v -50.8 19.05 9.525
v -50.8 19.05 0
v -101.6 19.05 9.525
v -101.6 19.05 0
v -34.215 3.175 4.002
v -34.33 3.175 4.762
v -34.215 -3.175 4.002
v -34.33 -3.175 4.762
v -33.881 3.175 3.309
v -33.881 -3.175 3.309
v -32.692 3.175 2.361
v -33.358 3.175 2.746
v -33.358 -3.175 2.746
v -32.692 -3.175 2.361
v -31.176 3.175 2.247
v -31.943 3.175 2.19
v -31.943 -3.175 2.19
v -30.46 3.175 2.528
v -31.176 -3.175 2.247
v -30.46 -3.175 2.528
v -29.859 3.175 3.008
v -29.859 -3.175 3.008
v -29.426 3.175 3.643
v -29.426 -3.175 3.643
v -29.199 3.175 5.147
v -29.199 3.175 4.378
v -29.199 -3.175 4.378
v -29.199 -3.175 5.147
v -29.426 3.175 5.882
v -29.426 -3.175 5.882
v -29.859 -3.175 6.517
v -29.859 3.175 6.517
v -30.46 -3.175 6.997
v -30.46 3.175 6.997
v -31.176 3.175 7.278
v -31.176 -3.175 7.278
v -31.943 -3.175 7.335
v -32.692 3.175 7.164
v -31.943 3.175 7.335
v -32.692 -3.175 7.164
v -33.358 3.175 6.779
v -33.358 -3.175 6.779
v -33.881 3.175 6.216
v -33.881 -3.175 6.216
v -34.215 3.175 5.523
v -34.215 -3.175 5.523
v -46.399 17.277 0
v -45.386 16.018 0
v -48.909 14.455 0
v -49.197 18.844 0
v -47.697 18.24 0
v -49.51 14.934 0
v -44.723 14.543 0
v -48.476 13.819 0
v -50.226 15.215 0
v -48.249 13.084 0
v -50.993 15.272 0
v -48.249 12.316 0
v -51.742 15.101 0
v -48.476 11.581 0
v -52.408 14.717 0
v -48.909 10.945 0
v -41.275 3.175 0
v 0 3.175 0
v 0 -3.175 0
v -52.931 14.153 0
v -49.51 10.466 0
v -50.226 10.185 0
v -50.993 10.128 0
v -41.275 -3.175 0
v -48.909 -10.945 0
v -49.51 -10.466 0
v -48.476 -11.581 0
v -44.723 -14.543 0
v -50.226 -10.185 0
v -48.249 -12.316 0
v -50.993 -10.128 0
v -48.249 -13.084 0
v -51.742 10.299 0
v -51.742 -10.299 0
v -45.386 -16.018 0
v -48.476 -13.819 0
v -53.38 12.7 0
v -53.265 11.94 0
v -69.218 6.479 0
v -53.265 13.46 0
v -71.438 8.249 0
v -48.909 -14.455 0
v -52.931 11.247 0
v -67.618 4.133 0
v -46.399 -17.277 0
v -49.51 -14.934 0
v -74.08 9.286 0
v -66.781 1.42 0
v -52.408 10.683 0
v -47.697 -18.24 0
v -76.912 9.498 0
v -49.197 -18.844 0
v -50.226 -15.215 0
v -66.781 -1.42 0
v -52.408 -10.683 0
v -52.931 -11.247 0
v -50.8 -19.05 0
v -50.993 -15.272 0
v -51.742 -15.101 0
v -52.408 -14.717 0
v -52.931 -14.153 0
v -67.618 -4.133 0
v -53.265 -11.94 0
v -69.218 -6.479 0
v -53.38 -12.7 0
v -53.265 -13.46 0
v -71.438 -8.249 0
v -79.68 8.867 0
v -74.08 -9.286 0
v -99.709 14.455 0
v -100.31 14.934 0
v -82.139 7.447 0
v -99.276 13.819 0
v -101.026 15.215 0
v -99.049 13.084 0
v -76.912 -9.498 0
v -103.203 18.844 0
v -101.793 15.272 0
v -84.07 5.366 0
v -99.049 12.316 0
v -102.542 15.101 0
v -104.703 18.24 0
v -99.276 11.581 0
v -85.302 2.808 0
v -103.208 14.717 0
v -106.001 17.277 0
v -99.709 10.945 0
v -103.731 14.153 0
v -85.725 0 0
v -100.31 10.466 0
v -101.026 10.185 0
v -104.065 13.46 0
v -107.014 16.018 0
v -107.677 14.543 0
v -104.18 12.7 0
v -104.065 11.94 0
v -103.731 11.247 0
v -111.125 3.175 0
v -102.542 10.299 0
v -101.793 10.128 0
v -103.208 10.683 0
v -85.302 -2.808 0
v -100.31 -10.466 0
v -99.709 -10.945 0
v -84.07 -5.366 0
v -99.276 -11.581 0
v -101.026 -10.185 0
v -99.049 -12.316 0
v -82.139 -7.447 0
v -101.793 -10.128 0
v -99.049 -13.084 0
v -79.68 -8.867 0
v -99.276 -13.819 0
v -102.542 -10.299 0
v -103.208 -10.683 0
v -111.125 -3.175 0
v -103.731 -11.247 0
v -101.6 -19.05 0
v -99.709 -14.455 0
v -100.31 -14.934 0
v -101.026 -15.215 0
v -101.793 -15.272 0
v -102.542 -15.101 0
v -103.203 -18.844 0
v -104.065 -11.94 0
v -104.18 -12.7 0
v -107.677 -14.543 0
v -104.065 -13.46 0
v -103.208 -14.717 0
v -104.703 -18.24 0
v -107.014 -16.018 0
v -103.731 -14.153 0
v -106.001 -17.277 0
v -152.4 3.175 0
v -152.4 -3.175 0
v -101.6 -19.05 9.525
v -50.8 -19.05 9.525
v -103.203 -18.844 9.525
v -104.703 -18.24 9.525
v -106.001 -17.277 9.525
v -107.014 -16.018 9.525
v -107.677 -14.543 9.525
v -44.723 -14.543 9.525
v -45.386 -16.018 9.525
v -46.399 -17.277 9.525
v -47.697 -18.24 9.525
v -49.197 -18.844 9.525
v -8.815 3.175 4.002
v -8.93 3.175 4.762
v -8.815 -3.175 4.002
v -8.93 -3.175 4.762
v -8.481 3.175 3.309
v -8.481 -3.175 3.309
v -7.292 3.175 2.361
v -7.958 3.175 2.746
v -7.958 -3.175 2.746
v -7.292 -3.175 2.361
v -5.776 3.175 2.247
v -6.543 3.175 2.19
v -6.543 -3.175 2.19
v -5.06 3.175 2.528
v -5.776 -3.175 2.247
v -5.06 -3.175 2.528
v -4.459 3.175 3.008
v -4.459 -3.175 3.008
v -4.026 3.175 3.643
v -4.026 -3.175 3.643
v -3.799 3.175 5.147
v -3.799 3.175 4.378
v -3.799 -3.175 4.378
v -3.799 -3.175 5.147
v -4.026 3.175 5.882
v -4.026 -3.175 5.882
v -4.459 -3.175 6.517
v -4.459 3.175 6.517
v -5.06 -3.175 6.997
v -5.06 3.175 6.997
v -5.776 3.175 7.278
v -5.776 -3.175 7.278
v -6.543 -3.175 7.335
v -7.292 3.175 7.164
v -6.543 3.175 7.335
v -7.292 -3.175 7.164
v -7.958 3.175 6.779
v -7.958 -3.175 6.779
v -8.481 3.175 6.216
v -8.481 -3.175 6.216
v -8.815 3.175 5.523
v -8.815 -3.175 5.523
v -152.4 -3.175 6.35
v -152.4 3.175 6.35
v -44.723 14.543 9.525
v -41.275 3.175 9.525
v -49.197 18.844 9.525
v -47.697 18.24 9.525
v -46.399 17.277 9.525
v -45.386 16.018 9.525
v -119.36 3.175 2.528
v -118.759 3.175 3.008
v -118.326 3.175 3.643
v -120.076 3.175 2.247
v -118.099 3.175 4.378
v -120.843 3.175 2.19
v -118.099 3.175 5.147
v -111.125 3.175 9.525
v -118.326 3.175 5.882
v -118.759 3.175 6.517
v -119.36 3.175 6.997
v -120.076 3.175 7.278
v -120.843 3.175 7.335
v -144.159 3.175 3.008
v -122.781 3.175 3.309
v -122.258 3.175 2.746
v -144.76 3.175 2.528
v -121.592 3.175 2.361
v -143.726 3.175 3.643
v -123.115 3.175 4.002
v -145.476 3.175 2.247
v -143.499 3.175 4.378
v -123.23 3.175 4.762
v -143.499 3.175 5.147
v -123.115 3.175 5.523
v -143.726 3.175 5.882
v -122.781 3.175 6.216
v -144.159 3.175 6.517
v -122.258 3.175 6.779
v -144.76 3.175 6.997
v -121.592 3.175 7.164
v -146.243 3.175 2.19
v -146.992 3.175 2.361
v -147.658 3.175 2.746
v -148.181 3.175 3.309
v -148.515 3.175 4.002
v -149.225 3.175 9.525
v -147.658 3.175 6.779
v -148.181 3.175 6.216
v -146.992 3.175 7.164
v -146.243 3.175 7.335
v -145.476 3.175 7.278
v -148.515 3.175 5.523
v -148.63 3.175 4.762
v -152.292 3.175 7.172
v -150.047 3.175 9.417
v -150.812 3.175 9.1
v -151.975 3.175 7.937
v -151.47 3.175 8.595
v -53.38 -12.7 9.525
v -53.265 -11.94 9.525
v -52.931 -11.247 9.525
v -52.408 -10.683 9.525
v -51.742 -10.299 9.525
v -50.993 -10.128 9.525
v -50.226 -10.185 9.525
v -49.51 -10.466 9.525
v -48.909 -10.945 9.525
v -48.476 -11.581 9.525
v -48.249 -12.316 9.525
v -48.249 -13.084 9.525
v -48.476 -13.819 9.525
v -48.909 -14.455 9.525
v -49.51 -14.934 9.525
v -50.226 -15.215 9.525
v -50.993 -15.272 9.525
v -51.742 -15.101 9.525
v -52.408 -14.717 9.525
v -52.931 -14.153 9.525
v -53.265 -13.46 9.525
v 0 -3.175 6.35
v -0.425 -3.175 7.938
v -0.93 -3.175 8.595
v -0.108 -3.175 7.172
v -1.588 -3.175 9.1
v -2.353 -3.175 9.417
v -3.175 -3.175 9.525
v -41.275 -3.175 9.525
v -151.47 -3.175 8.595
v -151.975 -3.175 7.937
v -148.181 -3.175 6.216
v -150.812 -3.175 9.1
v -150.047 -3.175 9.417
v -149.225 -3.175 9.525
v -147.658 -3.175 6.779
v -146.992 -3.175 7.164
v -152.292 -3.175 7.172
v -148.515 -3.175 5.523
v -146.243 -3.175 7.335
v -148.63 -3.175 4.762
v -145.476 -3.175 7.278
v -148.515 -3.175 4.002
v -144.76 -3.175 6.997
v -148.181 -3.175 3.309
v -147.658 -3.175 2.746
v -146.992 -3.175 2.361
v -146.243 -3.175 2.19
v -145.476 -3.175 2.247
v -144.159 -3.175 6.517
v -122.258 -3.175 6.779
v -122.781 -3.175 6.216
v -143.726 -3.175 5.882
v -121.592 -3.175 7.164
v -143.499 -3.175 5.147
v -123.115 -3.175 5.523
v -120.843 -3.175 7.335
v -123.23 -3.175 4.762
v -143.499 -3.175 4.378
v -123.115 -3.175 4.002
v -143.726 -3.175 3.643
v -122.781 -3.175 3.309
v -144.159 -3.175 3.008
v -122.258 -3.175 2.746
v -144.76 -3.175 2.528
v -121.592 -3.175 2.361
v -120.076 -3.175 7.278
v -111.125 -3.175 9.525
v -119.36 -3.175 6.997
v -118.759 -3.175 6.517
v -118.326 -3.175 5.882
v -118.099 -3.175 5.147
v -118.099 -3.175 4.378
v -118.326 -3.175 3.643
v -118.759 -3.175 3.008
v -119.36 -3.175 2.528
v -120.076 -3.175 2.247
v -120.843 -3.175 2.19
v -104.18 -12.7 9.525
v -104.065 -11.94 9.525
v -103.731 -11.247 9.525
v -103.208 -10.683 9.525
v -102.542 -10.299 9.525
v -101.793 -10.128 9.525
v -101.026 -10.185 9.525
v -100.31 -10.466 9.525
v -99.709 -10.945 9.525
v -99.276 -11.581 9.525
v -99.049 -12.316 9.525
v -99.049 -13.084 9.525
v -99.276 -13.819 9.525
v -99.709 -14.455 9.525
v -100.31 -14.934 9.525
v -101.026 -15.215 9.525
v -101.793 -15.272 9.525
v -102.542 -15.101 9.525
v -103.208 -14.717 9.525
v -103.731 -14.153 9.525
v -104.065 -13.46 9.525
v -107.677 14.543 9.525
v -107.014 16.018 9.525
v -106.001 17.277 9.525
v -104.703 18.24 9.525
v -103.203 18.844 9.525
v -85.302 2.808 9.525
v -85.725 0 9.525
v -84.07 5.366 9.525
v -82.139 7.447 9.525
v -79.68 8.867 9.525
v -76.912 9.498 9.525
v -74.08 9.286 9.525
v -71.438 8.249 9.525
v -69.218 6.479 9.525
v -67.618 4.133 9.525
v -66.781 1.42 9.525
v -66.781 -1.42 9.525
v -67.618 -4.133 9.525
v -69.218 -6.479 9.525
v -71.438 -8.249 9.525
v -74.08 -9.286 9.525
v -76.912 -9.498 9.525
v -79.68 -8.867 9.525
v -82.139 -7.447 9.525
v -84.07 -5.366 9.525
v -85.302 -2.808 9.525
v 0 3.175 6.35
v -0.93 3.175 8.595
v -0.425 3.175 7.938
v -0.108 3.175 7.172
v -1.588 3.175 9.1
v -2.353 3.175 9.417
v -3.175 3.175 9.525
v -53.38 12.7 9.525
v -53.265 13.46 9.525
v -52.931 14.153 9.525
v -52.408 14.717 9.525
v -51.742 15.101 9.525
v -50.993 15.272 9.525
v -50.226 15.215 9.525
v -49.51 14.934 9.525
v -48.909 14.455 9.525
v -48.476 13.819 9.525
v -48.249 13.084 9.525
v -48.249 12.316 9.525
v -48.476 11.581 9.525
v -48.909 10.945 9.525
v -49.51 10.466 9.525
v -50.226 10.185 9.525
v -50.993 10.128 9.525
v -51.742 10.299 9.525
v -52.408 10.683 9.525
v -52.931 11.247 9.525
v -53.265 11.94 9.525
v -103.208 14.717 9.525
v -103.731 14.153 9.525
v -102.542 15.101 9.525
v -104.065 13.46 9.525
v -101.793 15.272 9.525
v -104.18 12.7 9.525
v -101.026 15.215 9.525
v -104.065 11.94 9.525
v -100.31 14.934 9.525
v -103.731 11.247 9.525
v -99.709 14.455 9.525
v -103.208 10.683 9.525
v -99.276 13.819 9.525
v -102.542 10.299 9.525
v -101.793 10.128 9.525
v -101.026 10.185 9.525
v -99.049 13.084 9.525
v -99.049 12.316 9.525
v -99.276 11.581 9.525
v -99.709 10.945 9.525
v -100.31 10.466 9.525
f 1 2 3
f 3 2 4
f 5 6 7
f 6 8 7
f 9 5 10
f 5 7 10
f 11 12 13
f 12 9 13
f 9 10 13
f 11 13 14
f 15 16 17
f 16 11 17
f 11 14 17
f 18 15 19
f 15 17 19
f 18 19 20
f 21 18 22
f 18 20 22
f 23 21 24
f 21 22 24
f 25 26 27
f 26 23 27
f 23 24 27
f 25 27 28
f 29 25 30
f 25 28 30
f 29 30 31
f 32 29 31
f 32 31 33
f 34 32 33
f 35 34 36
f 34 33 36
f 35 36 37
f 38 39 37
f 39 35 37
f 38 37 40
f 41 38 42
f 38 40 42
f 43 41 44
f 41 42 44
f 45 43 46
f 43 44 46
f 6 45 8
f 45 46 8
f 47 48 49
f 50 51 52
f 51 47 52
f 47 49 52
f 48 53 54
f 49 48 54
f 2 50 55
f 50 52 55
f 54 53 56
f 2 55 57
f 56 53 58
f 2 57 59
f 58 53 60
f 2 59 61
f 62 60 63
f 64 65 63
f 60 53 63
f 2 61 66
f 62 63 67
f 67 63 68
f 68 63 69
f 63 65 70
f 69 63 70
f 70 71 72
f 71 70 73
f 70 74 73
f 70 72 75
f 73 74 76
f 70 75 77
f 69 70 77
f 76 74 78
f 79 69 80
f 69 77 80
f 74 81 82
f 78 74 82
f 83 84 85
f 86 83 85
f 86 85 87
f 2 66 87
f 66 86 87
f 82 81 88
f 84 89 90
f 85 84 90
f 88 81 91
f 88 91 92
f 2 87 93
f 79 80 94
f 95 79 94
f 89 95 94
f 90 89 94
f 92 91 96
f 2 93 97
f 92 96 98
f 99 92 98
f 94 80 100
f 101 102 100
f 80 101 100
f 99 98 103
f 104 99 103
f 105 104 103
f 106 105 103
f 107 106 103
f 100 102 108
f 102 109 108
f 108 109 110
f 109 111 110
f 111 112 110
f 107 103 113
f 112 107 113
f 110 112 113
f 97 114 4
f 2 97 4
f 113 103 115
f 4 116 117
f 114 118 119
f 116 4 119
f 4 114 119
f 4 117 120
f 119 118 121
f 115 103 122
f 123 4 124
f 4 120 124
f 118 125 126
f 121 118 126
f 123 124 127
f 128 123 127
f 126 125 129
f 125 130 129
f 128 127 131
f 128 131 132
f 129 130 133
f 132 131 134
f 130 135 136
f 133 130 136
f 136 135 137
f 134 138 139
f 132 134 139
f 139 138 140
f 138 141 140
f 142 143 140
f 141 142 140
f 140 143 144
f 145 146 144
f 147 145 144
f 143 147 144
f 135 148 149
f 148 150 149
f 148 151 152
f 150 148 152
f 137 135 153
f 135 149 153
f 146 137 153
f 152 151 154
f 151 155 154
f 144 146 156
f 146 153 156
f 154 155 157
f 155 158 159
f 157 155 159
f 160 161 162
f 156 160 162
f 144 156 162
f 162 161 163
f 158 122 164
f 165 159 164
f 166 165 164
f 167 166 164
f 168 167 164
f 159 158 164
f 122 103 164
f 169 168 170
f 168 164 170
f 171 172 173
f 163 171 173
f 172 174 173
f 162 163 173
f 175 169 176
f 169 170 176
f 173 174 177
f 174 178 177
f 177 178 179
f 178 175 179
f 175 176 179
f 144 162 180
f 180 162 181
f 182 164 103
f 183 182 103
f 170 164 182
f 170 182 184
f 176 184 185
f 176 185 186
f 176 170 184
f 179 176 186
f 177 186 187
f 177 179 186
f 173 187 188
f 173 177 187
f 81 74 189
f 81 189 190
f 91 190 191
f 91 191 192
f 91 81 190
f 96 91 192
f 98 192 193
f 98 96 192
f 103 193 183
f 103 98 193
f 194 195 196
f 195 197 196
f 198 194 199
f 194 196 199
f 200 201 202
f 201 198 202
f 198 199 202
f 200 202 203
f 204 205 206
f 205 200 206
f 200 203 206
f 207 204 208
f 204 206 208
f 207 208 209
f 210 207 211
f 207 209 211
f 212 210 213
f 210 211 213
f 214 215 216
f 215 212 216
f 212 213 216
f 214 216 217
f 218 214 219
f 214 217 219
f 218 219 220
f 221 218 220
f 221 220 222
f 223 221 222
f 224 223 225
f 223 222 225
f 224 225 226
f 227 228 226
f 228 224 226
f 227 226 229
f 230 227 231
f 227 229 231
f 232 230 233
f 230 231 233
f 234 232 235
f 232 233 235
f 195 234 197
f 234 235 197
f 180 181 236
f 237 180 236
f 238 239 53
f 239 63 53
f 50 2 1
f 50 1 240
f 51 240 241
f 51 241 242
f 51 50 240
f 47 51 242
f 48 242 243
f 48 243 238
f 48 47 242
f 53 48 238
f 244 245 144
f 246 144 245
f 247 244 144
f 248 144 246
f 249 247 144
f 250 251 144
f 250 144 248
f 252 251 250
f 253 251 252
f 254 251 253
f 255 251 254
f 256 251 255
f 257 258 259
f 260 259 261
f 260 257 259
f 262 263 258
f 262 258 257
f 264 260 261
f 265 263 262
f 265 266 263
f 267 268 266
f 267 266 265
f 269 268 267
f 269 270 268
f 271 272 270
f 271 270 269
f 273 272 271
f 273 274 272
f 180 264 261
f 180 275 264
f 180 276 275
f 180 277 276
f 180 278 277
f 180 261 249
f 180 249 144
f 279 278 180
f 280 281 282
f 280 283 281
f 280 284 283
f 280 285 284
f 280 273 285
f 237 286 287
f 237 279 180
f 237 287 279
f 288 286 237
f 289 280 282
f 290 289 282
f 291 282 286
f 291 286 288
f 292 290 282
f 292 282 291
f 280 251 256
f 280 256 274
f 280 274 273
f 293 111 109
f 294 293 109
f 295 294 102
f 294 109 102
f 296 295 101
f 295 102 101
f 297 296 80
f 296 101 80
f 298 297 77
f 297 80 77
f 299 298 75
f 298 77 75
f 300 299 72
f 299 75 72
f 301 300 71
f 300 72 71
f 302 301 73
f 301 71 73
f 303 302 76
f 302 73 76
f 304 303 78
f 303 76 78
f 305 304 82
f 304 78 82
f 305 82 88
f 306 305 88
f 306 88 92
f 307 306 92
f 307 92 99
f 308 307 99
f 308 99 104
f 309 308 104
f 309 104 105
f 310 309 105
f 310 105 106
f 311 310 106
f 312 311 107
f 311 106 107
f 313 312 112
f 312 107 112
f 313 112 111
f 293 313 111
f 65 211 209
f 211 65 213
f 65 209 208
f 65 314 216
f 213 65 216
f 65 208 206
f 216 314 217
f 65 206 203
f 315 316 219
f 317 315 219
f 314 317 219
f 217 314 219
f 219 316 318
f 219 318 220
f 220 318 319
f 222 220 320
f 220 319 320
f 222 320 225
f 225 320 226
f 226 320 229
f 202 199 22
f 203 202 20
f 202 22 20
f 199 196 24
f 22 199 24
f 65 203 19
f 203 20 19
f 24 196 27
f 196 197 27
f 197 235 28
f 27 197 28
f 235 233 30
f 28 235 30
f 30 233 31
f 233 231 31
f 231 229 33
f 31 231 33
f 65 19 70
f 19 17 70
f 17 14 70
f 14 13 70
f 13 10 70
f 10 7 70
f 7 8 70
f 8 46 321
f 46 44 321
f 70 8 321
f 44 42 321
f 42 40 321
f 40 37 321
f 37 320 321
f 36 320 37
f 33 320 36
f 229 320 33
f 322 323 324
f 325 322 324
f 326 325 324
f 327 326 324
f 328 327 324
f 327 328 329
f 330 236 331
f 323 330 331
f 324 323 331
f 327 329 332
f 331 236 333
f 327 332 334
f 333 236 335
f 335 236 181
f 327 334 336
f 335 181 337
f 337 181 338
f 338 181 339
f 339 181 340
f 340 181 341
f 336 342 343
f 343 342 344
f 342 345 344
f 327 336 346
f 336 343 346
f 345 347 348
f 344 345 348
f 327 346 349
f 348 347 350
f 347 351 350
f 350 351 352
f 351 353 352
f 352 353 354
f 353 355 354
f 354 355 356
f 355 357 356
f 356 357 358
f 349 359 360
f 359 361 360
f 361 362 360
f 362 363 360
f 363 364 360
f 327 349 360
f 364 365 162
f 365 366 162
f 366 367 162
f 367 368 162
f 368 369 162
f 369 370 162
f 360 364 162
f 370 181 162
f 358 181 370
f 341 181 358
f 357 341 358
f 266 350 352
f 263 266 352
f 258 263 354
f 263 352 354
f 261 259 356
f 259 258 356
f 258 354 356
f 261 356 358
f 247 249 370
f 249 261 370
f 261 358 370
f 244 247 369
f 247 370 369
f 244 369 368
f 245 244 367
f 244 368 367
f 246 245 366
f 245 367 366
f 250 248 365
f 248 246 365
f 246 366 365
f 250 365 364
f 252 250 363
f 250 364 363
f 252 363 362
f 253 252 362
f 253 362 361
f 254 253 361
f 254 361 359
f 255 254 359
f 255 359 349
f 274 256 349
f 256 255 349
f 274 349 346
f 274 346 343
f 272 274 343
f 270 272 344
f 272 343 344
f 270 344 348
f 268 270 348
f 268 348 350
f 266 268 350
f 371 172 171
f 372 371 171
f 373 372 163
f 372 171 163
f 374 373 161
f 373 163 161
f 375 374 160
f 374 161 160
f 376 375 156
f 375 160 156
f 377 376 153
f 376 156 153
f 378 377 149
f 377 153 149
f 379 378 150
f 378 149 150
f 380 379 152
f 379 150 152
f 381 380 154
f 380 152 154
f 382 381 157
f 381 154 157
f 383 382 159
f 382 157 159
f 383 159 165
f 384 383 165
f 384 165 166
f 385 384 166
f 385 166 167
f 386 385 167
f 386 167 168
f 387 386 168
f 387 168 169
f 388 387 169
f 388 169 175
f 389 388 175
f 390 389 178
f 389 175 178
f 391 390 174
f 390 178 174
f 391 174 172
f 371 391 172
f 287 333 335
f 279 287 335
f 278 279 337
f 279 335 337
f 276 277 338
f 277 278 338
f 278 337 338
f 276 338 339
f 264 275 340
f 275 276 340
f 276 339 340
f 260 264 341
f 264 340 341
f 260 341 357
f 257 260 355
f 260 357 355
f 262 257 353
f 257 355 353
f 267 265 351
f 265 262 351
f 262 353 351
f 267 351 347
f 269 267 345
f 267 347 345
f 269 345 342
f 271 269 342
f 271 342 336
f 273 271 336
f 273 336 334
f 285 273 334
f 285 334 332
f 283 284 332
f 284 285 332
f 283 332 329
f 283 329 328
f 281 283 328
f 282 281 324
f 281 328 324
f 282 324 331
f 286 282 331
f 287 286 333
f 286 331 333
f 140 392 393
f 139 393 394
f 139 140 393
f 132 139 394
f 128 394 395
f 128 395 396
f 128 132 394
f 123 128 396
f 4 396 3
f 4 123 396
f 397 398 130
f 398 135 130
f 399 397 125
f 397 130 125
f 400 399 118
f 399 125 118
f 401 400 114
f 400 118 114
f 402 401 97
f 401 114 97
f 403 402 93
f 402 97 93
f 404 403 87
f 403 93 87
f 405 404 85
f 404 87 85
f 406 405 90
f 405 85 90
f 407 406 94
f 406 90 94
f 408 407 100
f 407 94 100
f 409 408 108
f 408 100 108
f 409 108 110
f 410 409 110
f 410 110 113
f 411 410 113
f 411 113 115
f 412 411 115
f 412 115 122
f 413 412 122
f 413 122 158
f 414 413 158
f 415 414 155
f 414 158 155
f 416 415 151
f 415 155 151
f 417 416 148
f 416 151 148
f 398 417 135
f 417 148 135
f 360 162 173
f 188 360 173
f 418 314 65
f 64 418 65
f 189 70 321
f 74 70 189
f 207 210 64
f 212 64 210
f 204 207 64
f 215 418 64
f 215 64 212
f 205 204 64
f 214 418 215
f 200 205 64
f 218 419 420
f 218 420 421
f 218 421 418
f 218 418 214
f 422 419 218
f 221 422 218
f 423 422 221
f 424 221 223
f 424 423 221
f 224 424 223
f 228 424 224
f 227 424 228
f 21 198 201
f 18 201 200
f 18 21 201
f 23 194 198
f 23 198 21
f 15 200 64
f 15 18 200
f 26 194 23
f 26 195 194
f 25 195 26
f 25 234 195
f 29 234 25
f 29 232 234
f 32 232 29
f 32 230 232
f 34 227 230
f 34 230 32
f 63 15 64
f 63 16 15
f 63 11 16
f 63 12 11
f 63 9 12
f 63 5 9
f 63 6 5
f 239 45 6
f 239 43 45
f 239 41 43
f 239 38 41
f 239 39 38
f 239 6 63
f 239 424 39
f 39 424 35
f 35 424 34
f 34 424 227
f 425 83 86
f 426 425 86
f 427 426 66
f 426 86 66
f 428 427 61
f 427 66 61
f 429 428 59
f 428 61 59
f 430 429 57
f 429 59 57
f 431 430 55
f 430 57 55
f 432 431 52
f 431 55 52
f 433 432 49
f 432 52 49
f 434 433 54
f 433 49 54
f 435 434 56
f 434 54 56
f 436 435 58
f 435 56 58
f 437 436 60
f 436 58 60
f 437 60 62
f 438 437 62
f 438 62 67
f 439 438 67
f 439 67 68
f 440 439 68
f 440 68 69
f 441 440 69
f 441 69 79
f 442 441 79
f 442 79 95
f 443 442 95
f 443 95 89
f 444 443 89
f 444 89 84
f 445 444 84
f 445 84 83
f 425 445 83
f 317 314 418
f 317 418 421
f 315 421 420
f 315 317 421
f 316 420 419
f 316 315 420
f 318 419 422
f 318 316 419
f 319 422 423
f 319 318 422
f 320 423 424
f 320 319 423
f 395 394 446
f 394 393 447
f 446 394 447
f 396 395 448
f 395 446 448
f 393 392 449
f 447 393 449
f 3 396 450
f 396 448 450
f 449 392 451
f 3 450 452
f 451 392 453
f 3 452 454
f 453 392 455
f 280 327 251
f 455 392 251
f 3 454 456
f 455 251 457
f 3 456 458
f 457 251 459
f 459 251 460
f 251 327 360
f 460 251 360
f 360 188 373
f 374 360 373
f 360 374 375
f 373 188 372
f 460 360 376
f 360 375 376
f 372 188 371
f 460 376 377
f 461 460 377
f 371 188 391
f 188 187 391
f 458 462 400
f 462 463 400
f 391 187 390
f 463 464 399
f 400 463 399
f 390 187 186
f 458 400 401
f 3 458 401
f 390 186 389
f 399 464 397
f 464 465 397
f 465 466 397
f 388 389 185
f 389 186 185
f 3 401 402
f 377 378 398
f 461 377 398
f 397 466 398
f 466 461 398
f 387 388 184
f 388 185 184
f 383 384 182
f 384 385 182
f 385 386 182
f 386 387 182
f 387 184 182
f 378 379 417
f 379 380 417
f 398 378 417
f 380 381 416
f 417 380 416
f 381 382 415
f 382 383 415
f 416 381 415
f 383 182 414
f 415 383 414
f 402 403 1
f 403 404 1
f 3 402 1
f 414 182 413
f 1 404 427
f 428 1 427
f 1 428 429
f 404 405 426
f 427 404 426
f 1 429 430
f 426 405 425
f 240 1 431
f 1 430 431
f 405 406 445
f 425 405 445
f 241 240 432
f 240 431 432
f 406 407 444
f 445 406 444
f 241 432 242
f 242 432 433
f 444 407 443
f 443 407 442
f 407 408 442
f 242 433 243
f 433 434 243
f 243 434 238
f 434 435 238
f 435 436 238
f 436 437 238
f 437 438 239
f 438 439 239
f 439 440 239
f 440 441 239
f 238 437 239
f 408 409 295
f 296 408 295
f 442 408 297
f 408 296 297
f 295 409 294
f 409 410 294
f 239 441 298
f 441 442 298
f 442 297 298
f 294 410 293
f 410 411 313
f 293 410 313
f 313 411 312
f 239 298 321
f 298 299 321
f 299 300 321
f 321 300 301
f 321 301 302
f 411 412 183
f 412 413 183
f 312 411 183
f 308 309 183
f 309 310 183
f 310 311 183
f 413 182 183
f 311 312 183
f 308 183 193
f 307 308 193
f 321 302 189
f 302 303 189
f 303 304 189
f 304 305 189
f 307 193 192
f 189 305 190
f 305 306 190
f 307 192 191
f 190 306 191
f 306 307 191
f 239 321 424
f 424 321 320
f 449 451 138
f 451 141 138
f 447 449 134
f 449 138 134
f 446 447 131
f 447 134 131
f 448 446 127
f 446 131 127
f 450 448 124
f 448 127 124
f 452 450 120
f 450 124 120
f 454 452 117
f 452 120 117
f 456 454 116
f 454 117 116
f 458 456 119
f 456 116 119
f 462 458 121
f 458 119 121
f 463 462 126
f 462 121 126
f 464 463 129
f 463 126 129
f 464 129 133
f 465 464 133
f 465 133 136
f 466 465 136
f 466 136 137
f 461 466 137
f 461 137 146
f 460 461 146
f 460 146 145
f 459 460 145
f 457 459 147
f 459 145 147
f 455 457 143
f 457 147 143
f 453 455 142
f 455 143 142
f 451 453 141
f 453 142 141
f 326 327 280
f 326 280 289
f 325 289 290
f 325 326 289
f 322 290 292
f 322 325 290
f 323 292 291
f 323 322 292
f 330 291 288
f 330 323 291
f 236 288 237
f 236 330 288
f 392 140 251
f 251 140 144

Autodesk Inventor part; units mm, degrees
ref_plane "YZ Plane" through (0, 0, 0) normal (1, 0, 0) x (0, 1, 0)
ref_plane "XZ Plane" through (0, 0, 0) normal (0, 1, 0) x (-1, 0, 0)
ref_plane "XY Plane" through (0, 0, 0) normal (0, 0, 1) x (1, 0, 0)
sketch "Sketch1" plane through (0, 0, 0) normal (0, 1, 0) x (-1, 0, 0)
  line L0 (0, 0) -> (152.4, 0)
  line L1 (152.4, 0) -> (152.4, 6.35)
  line L2 (34.925, 9.525) -> (3.175, 9.525)
  line L3 (0, 6.35) -> (0, 0)
  circle A0 centre (6.35, 4.7625) radius 2.5797
  circle A1 centre (31.75, 4.7625) radius 2.5797
  circle A2 centre (120.65, 4.7625) radius 2.5797
  circle A3 centre (146.05, 4.7625) radius 2.5797
  line L4 (38.1, 9.525) -> (114.3, 9.525)
  line L5 (114.3, 6.35) -> (114.3, 4.7625)
  line L6 (38.1, 4.7625) -> (38.1, 6.35)
  arc A4 (38.1, 6.35) -> (34.925, 9.525) centre (34.925, 6.35) ccw
  arc A5 (3.175, 9.525) -> (0, 6.35) centre (3.175, 6.35) ccw
  line L7 (117.475, 9.525) -> (149.225, 9.525)
  arc A6 (117.475, 9.525) -> (114.3, 6.35) centre (117.475, 6.35) ccw
  arc A7 (152.4, 6.35) -> (149.225, 9.525) centre (149.225, 6.35) ccw
  line L8 (114.3, 6.35) -> (114.3, 0)
  line L9 (38.1, 6.35) -> (38.1, 0)
  line L10 (114.3, 4.7625) -> (114.3, 9.525)
  line L11 (117.475, 9.525) -> (114.3, 9.525)
  line L12 (38.1, 6.35) -> (38.1, 9.525)
  line L13 (38.1, 9.525) -> (34.925, 9.525)
  line L14 (38.1, 3.175) -> (114.3, 3.175)
  line L15 (88.9, 3.175) -> (116.778, 9.4476)
  line L16 (63.5, 3.175) -> (35.622, 9.4476)
  point P0 (152.4, 9.525)
  point P1 (0, 9.525)
  point P2 (114.3, 3.175)
  dimension "d0" = 152.4
  dimension "d1" = 9.525
  dimension "d2" = 4.7625
  dimension "d3" = 4.7625
  dimension "d4" = 4.7625
  dimension "d5" = 4.7625
  dimension "d6" = 25.4
  dimension "d7" = 25.4
  dimension "d8" = 5.1594
  dimension "d9" = 6.35
  dimension "d10" = 6.35
  dimension "d11" = 4.7625
  dimension "d12" = 6.35
  dimension "d13" = 6.35
  dimension "d14" = 3.175
  dimension "d15" = 3.175
  dimension "d37" = 3.175
  dimension "d100" = 25.4
extrude "Extrusion1" add sketch "Sketch1" along normal mid plane 6.35
extrude "Extrusion2" add sketch "Sketch1" along normal mid plane 50.8 contours L9 L14 L8 L0 | L9 L6 L12 L16 L14 | L14 L15 L10 L5 L8 | L16 L12 L4 L10 L15 L14
sketch "Sketch4" plane through (-38.1, 25.4, 0) normal (0, 0, -1) x (-1, 0, 0)
  line L0 (76.2, -50.8) -> (76.2, -28.575) projected
  line L1 (0, 0) -> (76.2, 0)
  line L2 (76.2, 0) -> (76.2, -50.8)
  line L3 (76.2, -50.8) -> (0, -50.8)
  line L4 (0, -50.8) -> (0, 0)
  circle A0 centre (38.1, -25.4) radius 9.525
  circle A1 centre (12.7, -12.7) radius 2.5797
  circle A2 centre (12.7, -38.1) radius 2.5797
  circle A3 centre (63.5, -12.7) radius 2.5797
  circle A4 centre (63.5, -38.1) radius 2.5797
  circle A5 centre (12.7, -12.7) radius 6.35
  circle A6 centre (12.7, -38.1) radius 6.35
  circle A7 centre (63.5, -12.7) radius 6.35
  circle A8 centre (63.5, -38.1) radius 6.35
  line L5 (12.7, -6.35) -> (63.5, -6.35)
  line L6 (69.85, -11.1925) -> (69.85, -39.6075)
  line L7 (63.5, -44.45) -> (12.7, -44.45)
  line L8 (6.35, -39.6075) -> (6.35, -11.1925)
  line L9 (-38.1, -22.225) -> (6.35, -22.225)
  line L10 (6.35, -22.225) -> (6.35, -28.575)
  line L11 (6.35, -28.575) -> (-38.1, -28.575)
  line L12 (-38.1, -28.575) -> (-38.1, -22.225)
  line L13 (69.85, -22.225) -> (114.3, -22.225)
  line L14 (114.3, -22.225) -> (114.3, -28.575)
  line L15 (114.3, -28.575) -> (69.85, -28.575)
  line L16 (69.85, -28.575) -> (69.85, -22.225)
  line L17 (-38.1, -28.575) -> (-38.1, -22.225) projected
  line L18 (0, -28.575) -> (-38.1, -28.575) projected
  line L19 (3.175, -22.225) -> (6.6234, -10.8567)
  line L20 (3.175, -28.575) -> (6.6234, -39.9433)
  line L21 (69.5766, -10.8567) -> (73.025, -22.225)
  line L22 (73.025, -28.575) -> (69.5766, -39.9433)
  point P0 (-38.1, -25.4)
  point P1 (-38.1, -25.4)
  point P2 (7.0276, -9.8458)
  point P3 (0, -22.225)
  point P4 (7.0276, -40.9542)
  point P5 (76.2, -22.225)
  point P6 (69.1724, -9.8458)
  point P7 (69.1724, -40.9542)
  point P8 (0, -22.225)
  dimension "d71" = 76.2
  dimension "d72" = 50.8
  dimension "d73" = 25.4
  dimension "d74" = 38.1
  dimension "d75" = 19.05
  dimension "d78" = 25.4
  dimension "d81" = 50.8
  dimension "d84" = 12.7
  dimension "d85" = 12.7
  dimension "d86" = 5.1594
  dimension "d87" = 12.7
  dimension "d90" = 25.4
  dimension "d93" = 50.8
  dimension "d96" = 3.175
  dimension "d97" = 6.35
  dimension "d111" = 3.175
extrude "Extrusion5" cut sketch "Sketch4" against normal through all contours L3 L4 L11 L20 A6 L7 A8 L22 L15 L0 | L13 L21 A7 L5 A5 L19 L9 L4 L1 L2 | A0 | A1 | A2 | A3 | A4
equation "\"d2\" = 0.5 * d1"
equation "\"d3\" = d2"
equation "\"d4\" = d2"
equation "\"d5\" = d2"
equation "\"d10\" = d9"
equation "\"d11\" = 0.5 * d1"
equation "\"d37\" = 0.333333 * d1"
properties part number "Face Plate"
